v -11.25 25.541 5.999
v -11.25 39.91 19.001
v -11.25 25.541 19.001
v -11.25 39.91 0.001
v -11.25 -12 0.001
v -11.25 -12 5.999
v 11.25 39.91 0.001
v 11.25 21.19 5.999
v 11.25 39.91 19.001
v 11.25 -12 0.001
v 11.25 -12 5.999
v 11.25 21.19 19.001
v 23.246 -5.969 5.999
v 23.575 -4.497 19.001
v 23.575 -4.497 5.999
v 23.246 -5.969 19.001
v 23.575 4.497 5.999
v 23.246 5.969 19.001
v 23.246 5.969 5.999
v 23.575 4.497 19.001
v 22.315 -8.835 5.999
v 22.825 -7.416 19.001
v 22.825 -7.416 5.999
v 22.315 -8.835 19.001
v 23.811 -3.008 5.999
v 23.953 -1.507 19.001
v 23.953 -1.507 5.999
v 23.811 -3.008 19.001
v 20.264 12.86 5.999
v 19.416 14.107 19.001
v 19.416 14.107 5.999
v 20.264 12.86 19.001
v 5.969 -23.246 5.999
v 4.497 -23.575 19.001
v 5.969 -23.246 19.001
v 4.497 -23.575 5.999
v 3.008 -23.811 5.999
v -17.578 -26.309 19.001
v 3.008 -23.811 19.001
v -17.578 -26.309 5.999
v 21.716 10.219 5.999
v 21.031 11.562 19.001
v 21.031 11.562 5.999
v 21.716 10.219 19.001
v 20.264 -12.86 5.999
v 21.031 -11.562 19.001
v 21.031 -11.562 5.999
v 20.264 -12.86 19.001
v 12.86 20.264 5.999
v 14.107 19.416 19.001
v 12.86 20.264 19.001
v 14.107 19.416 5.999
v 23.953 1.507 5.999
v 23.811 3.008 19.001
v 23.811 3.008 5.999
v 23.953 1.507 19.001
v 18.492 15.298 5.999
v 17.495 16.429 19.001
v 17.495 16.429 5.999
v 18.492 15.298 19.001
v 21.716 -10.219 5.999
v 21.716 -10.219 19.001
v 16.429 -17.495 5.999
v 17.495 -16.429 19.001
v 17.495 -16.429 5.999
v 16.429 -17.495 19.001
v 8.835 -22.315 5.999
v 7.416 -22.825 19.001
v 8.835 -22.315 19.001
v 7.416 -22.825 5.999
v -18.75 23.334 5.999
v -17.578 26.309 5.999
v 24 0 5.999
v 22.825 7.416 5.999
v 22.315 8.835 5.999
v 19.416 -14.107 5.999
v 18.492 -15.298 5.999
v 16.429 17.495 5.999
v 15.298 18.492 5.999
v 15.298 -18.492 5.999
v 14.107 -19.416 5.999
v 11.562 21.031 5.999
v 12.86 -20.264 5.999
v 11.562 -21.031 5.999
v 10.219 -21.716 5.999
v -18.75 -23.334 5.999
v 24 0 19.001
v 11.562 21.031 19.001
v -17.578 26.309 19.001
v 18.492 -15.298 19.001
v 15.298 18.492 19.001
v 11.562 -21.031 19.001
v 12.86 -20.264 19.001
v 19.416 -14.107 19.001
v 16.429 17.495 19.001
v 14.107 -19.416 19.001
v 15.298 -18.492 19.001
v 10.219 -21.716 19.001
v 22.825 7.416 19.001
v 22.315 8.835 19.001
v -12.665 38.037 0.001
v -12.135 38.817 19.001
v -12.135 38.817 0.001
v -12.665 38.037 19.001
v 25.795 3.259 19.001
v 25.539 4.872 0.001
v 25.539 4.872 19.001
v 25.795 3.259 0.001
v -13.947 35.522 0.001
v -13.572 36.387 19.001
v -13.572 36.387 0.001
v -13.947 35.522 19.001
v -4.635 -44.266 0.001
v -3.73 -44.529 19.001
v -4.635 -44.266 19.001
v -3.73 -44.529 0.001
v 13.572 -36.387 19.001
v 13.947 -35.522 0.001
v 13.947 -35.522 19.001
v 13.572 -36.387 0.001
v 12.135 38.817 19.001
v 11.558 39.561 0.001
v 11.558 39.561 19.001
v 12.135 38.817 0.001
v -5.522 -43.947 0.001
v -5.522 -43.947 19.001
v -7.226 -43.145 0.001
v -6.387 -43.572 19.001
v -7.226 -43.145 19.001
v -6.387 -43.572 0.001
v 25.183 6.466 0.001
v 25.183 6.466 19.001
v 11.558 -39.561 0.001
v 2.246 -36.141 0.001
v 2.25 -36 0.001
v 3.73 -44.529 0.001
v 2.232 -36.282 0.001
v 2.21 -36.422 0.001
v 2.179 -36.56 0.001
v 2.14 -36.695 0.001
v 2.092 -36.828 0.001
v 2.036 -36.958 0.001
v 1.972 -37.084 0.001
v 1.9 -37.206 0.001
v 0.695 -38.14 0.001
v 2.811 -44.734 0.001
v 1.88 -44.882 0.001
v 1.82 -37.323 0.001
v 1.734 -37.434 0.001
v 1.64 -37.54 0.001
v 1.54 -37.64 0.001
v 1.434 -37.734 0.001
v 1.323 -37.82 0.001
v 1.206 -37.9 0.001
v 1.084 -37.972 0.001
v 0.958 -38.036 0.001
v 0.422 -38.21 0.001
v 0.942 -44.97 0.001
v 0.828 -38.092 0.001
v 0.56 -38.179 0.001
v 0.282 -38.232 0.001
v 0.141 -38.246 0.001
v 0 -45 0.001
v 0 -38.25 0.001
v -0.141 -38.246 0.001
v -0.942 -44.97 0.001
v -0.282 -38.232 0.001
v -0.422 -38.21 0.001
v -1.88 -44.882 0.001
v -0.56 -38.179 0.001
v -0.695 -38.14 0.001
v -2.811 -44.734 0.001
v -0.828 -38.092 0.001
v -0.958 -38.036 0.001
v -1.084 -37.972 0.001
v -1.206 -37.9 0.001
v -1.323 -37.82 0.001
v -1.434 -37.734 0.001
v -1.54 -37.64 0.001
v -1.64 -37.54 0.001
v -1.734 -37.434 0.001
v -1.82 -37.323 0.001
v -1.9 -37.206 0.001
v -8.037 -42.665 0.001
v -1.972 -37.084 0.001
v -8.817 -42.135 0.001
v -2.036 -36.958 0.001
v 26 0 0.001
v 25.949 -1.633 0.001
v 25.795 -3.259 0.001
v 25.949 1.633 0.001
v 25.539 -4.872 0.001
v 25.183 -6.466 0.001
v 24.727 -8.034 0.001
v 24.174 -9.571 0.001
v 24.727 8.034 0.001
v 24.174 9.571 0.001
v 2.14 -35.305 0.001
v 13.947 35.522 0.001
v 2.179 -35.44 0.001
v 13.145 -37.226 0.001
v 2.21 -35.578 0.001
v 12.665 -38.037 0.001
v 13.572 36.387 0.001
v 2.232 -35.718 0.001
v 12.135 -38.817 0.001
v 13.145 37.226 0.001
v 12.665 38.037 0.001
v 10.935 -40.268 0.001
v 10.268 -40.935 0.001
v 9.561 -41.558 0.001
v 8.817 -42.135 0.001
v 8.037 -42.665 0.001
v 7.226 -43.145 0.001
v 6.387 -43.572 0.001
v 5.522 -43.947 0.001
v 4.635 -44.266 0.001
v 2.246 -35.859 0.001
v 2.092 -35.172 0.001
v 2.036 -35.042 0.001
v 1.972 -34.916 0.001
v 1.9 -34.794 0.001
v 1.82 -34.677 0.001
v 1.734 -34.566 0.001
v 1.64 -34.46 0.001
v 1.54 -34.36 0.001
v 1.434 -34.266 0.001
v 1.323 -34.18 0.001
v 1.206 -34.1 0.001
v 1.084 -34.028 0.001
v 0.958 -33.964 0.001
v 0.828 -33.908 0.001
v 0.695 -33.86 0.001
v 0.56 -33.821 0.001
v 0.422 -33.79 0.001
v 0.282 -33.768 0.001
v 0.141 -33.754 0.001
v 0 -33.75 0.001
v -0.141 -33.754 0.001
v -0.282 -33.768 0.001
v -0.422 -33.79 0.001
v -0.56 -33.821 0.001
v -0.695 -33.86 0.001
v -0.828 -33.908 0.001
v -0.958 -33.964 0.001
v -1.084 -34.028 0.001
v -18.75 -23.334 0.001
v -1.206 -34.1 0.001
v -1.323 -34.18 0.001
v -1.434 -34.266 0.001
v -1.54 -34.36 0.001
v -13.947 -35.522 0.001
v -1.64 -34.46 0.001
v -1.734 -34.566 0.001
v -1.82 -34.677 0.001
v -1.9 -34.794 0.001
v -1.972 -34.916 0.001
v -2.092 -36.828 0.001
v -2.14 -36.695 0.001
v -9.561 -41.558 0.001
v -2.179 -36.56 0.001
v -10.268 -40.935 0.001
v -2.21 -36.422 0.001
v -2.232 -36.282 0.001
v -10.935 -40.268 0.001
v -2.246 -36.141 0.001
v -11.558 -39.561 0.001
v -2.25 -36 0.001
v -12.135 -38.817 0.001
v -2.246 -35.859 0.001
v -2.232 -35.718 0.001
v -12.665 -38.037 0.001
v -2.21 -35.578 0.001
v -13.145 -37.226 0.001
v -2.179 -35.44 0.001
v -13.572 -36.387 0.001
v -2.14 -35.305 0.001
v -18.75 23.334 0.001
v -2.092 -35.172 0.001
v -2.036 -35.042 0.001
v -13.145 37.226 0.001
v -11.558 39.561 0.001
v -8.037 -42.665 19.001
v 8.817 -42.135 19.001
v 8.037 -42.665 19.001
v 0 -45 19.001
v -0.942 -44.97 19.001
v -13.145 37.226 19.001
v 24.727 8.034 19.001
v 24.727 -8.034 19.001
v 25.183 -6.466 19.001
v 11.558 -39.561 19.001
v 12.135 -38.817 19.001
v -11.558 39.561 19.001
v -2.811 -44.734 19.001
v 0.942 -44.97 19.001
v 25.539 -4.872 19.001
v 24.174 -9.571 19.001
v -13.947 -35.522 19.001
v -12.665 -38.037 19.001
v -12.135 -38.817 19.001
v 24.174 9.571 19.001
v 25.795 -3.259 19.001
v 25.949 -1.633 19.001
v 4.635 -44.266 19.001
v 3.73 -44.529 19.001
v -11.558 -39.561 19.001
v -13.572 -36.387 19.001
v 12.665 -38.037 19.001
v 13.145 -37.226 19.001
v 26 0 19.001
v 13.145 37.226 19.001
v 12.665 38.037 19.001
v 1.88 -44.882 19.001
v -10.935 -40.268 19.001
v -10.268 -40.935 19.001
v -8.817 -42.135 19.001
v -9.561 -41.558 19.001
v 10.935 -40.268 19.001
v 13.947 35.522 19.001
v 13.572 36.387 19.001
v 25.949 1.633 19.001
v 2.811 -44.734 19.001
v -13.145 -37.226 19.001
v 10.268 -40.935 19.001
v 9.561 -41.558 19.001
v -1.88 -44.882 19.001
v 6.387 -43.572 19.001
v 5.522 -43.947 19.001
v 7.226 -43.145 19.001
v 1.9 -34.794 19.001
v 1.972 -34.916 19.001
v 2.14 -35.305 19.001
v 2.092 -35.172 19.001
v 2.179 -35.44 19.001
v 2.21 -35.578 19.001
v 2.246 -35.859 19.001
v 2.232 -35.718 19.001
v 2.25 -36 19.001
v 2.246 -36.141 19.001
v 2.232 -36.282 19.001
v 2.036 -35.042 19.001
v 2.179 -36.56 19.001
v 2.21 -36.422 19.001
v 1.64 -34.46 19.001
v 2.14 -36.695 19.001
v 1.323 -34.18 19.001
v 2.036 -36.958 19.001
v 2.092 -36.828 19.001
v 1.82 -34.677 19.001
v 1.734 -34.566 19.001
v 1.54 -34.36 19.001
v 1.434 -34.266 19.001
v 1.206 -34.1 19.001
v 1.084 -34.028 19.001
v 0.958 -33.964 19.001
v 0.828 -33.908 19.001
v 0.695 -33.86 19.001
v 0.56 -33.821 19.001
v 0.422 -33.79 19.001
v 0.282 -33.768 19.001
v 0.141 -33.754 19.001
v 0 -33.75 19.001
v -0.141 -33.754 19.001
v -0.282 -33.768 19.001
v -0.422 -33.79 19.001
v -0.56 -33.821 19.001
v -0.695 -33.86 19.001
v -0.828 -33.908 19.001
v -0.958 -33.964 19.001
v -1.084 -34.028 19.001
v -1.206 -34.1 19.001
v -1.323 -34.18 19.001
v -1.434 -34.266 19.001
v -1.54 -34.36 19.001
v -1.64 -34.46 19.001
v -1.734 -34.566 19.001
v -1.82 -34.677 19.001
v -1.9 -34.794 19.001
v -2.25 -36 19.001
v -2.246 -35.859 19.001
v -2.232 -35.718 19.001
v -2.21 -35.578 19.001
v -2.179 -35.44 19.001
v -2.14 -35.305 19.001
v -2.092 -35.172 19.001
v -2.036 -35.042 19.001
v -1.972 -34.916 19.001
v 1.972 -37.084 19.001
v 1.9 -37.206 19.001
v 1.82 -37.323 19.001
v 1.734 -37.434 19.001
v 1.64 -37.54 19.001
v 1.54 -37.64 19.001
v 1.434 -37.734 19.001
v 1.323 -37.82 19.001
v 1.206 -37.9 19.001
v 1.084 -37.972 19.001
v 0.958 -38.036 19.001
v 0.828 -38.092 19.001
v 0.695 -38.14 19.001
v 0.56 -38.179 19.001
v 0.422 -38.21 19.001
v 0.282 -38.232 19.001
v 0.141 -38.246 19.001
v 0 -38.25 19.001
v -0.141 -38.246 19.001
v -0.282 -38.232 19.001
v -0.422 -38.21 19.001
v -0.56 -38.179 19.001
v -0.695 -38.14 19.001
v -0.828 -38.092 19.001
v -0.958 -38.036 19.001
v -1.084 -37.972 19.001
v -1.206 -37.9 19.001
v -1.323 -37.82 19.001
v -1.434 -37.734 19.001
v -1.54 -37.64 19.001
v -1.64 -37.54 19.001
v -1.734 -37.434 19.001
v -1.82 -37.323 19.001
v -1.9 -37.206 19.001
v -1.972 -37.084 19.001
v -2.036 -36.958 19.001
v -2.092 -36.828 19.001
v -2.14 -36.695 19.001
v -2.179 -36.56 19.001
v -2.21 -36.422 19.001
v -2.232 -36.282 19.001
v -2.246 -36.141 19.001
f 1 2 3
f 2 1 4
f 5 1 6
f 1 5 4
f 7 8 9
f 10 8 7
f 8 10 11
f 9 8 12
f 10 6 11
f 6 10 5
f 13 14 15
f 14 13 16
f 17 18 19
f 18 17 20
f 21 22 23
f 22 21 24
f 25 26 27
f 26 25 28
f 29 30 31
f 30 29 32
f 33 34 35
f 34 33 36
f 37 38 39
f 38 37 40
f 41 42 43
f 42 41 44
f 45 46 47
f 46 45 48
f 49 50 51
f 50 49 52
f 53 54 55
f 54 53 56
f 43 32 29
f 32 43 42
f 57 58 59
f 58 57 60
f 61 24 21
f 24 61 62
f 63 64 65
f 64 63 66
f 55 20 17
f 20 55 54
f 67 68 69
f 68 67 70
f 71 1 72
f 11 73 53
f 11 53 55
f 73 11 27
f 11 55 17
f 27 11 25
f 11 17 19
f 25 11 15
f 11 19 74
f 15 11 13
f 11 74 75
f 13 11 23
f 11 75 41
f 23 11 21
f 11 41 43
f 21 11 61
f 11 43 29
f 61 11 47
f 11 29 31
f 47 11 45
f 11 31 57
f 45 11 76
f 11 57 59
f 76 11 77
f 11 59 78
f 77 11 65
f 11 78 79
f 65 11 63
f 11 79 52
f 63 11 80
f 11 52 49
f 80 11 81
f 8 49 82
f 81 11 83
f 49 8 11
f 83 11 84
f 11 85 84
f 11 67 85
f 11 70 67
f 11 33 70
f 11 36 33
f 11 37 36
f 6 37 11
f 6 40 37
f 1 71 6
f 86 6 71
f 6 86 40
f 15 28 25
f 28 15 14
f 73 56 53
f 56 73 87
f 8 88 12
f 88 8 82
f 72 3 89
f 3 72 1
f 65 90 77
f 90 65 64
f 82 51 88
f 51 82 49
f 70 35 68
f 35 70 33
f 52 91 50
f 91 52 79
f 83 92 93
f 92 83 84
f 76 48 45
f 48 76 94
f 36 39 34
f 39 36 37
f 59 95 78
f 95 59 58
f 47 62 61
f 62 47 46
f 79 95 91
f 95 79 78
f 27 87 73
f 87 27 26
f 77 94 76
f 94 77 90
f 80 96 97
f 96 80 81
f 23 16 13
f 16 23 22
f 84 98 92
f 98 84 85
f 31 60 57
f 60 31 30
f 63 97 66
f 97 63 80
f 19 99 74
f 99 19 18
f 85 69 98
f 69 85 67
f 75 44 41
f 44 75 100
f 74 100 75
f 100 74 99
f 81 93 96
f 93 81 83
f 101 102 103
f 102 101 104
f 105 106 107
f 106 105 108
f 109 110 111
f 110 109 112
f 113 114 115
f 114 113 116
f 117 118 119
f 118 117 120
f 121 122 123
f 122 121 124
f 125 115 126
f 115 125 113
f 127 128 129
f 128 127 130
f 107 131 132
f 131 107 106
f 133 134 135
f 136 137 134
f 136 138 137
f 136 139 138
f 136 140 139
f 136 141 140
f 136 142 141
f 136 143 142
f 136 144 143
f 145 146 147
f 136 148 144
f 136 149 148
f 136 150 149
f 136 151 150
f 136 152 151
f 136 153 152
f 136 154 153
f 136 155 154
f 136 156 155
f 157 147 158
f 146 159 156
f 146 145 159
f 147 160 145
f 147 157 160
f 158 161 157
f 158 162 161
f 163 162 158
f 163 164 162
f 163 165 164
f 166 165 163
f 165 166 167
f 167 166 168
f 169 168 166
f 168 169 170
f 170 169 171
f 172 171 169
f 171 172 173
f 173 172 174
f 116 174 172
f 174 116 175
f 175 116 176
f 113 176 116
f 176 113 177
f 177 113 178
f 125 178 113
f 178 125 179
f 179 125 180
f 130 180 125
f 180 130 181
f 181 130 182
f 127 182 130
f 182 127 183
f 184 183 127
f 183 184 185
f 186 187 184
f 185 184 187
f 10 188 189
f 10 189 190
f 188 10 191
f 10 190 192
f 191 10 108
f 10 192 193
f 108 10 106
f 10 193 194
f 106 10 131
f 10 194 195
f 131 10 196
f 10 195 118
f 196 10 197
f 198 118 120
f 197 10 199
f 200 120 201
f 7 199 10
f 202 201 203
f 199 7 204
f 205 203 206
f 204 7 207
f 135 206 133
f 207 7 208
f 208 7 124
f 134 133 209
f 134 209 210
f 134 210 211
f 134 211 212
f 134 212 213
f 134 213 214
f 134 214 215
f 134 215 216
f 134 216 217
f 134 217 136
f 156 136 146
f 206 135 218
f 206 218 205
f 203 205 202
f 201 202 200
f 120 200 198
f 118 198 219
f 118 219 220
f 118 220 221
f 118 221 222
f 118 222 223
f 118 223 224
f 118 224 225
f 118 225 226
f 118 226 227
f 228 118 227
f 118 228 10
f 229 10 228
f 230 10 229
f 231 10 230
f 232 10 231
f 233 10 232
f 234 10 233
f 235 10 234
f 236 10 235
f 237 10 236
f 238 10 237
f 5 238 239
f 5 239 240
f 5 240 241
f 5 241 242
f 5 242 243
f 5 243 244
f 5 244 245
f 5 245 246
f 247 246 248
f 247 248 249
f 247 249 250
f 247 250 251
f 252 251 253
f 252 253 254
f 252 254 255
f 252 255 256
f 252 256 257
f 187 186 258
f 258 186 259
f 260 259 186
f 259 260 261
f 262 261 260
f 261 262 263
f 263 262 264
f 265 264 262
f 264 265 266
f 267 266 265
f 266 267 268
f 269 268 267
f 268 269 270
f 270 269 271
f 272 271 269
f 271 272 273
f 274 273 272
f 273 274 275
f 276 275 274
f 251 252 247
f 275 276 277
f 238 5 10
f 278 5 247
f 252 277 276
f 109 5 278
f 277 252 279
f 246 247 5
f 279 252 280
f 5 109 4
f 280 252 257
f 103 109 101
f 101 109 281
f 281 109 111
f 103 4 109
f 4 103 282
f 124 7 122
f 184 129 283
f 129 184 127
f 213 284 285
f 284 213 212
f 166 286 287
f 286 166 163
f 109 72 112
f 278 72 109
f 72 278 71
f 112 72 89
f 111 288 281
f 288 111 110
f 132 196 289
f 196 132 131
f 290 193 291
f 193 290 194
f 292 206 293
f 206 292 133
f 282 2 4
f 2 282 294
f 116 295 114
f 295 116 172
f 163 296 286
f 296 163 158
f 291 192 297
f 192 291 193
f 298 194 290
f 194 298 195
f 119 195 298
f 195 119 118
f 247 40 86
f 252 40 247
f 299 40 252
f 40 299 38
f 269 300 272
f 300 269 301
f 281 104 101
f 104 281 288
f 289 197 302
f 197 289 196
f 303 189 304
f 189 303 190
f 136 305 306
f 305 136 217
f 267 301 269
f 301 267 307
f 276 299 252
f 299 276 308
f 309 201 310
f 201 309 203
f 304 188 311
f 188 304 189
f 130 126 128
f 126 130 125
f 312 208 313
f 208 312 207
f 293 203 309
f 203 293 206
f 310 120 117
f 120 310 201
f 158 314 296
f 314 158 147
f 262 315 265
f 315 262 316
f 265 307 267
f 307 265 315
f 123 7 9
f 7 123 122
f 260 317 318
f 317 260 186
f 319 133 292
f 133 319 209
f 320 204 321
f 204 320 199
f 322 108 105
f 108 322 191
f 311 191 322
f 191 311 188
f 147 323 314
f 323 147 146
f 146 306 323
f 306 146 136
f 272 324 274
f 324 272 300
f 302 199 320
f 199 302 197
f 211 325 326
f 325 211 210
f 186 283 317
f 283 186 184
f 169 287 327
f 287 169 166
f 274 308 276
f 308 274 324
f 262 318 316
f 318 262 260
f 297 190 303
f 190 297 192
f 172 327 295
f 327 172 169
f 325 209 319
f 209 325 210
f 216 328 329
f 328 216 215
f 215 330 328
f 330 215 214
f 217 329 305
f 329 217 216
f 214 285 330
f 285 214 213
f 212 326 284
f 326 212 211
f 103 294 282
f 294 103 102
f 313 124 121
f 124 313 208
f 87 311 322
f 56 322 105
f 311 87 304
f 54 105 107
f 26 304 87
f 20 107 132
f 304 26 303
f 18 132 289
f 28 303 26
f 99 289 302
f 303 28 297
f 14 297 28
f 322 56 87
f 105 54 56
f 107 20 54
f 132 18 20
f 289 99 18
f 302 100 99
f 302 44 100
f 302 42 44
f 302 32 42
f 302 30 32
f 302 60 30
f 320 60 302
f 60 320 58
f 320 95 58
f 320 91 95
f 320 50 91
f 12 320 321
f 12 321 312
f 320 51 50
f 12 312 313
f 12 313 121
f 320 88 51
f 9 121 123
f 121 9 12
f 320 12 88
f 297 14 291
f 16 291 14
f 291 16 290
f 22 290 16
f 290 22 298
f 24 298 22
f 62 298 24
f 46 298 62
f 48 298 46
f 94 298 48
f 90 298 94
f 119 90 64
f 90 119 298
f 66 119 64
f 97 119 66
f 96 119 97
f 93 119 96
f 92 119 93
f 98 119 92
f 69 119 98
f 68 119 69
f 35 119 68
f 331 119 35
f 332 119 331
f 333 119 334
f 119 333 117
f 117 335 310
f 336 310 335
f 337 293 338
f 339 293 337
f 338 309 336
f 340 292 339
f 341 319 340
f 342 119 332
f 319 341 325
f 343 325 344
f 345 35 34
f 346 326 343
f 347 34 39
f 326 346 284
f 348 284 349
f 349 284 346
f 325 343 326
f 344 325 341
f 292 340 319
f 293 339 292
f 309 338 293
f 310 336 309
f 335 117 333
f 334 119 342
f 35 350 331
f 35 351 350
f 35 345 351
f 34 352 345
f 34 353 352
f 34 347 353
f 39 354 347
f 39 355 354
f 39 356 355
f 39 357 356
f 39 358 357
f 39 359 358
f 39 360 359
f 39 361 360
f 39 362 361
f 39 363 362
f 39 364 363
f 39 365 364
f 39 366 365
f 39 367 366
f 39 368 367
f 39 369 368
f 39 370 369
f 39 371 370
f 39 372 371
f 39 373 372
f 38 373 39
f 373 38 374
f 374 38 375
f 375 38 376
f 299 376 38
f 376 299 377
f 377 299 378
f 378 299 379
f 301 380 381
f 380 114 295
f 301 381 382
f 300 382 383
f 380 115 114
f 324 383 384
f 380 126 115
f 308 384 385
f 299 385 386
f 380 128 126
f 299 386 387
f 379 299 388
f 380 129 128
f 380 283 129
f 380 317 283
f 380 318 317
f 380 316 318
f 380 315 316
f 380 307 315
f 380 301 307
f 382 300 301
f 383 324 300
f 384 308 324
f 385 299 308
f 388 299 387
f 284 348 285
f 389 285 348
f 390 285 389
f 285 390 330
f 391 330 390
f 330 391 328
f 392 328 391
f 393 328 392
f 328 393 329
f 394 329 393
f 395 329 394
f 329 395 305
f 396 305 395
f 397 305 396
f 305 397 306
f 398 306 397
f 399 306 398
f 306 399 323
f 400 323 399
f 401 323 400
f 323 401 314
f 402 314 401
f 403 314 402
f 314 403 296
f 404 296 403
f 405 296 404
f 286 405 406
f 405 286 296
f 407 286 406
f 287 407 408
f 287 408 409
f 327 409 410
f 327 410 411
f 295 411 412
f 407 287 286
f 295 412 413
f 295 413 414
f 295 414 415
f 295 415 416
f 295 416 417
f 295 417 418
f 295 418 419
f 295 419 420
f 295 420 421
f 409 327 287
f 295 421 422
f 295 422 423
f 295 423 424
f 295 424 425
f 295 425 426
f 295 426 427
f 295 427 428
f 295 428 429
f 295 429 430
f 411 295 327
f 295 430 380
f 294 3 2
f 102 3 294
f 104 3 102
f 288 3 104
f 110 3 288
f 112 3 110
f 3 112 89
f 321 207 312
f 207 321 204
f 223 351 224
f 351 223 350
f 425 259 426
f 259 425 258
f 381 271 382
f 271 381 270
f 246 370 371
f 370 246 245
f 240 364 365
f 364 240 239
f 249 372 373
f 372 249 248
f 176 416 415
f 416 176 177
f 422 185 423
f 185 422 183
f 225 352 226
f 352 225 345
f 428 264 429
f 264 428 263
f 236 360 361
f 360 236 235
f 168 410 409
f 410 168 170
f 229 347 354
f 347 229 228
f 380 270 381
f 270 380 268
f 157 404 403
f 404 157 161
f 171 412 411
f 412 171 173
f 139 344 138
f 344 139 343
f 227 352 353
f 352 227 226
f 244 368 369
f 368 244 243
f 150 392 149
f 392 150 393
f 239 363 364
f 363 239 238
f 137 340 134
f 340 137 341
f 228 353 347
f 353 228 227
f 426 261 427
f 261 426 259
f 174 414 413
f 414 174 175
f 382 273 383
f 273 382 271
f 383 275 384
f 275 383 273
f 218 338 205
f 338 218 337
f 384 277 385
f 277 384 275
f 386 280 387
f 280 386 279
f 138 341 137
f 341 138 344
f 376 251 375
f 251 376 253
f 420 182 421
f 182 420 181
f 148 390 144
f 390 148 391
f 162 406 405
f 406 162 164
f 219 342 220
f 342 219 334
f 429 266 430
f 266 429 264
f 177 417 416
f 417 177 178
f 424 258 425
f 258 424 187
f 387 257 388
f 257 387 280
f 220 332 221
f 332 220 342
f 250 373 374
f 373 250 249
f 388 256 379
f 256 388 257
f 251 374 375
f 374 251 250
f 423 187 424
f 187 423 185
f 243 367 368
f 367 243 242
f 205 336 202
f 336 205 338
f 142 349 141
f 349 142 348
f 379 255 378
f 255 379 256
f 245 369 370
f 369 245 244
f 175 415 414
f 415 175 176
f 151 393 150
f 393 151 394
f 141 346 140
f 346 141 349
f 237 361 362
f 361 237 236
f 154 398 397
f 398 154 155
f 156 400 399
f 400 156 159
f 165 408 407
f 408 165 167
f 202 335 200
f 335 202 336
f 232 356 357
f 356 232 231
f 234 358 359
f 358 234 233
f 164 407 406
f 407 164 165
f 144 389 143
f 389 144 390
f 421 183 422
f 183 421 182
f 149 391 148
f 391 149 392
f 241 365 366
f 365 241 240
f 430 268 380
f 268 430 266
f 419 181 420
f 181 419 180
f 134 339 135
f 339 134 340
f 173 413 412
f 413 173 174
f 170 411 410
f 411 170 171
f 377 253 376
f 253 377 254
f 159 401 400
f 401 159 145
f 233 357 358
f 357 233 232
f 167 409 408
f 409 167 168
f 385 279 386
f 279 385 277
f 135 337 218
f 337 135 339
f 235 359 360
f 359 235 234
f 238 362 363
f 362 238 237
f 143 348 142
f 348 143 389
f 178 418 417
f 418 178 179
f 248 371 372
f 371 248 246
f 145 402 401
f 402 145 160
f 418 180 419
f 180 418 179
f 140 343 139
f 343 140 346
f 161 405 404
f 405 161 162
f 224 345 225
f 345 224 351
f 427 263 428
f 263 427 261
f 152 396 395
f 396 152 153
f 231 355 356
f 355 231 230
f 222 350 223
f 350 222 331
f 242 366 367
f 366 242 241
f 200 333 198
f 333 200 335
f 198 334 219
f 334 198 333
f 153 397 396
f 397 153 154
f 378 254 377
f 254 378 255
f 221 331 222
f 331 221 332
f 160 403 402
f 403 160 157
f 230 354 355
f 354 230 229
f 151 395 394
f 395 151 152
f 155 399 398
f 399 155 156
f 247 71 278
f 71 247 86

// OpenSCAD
pulleyDia = 48;
pulleyHeight = 13;
holeDia=4.5;

$fn=100;

mirror([1,0,0])
difference() {
   hull(){
      translate([0,0,.001])
	 cylinder(d=52,h=pulleyHeight+6);

      translate([0,30,.001])
	 cylinder(d=30,h=pulleyHeight+6);

      translate([0,-30,.001])
	 cylinder(d=30,h=pulleyHeight+6);
      
   }

   translate([0,-36,-.001])
      cylinder(d=holeDia,h=pulleyHeight*5);

   translate([0,36,-.001])
      cylinder(d=holeDia,h=pulleyHeight*5);
	 
   
   /* slope */
   /* translate([0,20,0]) */
   /*    rotate([-85,0,0]) */
   /*    cylinder(d=22.5,h=30); */

   translate([30,0,0])
      cube([22.5,100,20], center=true);

   /* motor */
   union() {
      translate([-22.5/2,-12,0])
	 cube([22.5,150,20]);

	 hull() {
	 translate([0,0,6-.001])
	    cylinder(d=pulleyDia, h=pulleyHeight*2);

	 translate([pulleyDia,0,6-.001])
	    cylinder(d=pulleyDia*1.25, h=pulleyHeight,$fn=20);
	 
      }
   }
}
